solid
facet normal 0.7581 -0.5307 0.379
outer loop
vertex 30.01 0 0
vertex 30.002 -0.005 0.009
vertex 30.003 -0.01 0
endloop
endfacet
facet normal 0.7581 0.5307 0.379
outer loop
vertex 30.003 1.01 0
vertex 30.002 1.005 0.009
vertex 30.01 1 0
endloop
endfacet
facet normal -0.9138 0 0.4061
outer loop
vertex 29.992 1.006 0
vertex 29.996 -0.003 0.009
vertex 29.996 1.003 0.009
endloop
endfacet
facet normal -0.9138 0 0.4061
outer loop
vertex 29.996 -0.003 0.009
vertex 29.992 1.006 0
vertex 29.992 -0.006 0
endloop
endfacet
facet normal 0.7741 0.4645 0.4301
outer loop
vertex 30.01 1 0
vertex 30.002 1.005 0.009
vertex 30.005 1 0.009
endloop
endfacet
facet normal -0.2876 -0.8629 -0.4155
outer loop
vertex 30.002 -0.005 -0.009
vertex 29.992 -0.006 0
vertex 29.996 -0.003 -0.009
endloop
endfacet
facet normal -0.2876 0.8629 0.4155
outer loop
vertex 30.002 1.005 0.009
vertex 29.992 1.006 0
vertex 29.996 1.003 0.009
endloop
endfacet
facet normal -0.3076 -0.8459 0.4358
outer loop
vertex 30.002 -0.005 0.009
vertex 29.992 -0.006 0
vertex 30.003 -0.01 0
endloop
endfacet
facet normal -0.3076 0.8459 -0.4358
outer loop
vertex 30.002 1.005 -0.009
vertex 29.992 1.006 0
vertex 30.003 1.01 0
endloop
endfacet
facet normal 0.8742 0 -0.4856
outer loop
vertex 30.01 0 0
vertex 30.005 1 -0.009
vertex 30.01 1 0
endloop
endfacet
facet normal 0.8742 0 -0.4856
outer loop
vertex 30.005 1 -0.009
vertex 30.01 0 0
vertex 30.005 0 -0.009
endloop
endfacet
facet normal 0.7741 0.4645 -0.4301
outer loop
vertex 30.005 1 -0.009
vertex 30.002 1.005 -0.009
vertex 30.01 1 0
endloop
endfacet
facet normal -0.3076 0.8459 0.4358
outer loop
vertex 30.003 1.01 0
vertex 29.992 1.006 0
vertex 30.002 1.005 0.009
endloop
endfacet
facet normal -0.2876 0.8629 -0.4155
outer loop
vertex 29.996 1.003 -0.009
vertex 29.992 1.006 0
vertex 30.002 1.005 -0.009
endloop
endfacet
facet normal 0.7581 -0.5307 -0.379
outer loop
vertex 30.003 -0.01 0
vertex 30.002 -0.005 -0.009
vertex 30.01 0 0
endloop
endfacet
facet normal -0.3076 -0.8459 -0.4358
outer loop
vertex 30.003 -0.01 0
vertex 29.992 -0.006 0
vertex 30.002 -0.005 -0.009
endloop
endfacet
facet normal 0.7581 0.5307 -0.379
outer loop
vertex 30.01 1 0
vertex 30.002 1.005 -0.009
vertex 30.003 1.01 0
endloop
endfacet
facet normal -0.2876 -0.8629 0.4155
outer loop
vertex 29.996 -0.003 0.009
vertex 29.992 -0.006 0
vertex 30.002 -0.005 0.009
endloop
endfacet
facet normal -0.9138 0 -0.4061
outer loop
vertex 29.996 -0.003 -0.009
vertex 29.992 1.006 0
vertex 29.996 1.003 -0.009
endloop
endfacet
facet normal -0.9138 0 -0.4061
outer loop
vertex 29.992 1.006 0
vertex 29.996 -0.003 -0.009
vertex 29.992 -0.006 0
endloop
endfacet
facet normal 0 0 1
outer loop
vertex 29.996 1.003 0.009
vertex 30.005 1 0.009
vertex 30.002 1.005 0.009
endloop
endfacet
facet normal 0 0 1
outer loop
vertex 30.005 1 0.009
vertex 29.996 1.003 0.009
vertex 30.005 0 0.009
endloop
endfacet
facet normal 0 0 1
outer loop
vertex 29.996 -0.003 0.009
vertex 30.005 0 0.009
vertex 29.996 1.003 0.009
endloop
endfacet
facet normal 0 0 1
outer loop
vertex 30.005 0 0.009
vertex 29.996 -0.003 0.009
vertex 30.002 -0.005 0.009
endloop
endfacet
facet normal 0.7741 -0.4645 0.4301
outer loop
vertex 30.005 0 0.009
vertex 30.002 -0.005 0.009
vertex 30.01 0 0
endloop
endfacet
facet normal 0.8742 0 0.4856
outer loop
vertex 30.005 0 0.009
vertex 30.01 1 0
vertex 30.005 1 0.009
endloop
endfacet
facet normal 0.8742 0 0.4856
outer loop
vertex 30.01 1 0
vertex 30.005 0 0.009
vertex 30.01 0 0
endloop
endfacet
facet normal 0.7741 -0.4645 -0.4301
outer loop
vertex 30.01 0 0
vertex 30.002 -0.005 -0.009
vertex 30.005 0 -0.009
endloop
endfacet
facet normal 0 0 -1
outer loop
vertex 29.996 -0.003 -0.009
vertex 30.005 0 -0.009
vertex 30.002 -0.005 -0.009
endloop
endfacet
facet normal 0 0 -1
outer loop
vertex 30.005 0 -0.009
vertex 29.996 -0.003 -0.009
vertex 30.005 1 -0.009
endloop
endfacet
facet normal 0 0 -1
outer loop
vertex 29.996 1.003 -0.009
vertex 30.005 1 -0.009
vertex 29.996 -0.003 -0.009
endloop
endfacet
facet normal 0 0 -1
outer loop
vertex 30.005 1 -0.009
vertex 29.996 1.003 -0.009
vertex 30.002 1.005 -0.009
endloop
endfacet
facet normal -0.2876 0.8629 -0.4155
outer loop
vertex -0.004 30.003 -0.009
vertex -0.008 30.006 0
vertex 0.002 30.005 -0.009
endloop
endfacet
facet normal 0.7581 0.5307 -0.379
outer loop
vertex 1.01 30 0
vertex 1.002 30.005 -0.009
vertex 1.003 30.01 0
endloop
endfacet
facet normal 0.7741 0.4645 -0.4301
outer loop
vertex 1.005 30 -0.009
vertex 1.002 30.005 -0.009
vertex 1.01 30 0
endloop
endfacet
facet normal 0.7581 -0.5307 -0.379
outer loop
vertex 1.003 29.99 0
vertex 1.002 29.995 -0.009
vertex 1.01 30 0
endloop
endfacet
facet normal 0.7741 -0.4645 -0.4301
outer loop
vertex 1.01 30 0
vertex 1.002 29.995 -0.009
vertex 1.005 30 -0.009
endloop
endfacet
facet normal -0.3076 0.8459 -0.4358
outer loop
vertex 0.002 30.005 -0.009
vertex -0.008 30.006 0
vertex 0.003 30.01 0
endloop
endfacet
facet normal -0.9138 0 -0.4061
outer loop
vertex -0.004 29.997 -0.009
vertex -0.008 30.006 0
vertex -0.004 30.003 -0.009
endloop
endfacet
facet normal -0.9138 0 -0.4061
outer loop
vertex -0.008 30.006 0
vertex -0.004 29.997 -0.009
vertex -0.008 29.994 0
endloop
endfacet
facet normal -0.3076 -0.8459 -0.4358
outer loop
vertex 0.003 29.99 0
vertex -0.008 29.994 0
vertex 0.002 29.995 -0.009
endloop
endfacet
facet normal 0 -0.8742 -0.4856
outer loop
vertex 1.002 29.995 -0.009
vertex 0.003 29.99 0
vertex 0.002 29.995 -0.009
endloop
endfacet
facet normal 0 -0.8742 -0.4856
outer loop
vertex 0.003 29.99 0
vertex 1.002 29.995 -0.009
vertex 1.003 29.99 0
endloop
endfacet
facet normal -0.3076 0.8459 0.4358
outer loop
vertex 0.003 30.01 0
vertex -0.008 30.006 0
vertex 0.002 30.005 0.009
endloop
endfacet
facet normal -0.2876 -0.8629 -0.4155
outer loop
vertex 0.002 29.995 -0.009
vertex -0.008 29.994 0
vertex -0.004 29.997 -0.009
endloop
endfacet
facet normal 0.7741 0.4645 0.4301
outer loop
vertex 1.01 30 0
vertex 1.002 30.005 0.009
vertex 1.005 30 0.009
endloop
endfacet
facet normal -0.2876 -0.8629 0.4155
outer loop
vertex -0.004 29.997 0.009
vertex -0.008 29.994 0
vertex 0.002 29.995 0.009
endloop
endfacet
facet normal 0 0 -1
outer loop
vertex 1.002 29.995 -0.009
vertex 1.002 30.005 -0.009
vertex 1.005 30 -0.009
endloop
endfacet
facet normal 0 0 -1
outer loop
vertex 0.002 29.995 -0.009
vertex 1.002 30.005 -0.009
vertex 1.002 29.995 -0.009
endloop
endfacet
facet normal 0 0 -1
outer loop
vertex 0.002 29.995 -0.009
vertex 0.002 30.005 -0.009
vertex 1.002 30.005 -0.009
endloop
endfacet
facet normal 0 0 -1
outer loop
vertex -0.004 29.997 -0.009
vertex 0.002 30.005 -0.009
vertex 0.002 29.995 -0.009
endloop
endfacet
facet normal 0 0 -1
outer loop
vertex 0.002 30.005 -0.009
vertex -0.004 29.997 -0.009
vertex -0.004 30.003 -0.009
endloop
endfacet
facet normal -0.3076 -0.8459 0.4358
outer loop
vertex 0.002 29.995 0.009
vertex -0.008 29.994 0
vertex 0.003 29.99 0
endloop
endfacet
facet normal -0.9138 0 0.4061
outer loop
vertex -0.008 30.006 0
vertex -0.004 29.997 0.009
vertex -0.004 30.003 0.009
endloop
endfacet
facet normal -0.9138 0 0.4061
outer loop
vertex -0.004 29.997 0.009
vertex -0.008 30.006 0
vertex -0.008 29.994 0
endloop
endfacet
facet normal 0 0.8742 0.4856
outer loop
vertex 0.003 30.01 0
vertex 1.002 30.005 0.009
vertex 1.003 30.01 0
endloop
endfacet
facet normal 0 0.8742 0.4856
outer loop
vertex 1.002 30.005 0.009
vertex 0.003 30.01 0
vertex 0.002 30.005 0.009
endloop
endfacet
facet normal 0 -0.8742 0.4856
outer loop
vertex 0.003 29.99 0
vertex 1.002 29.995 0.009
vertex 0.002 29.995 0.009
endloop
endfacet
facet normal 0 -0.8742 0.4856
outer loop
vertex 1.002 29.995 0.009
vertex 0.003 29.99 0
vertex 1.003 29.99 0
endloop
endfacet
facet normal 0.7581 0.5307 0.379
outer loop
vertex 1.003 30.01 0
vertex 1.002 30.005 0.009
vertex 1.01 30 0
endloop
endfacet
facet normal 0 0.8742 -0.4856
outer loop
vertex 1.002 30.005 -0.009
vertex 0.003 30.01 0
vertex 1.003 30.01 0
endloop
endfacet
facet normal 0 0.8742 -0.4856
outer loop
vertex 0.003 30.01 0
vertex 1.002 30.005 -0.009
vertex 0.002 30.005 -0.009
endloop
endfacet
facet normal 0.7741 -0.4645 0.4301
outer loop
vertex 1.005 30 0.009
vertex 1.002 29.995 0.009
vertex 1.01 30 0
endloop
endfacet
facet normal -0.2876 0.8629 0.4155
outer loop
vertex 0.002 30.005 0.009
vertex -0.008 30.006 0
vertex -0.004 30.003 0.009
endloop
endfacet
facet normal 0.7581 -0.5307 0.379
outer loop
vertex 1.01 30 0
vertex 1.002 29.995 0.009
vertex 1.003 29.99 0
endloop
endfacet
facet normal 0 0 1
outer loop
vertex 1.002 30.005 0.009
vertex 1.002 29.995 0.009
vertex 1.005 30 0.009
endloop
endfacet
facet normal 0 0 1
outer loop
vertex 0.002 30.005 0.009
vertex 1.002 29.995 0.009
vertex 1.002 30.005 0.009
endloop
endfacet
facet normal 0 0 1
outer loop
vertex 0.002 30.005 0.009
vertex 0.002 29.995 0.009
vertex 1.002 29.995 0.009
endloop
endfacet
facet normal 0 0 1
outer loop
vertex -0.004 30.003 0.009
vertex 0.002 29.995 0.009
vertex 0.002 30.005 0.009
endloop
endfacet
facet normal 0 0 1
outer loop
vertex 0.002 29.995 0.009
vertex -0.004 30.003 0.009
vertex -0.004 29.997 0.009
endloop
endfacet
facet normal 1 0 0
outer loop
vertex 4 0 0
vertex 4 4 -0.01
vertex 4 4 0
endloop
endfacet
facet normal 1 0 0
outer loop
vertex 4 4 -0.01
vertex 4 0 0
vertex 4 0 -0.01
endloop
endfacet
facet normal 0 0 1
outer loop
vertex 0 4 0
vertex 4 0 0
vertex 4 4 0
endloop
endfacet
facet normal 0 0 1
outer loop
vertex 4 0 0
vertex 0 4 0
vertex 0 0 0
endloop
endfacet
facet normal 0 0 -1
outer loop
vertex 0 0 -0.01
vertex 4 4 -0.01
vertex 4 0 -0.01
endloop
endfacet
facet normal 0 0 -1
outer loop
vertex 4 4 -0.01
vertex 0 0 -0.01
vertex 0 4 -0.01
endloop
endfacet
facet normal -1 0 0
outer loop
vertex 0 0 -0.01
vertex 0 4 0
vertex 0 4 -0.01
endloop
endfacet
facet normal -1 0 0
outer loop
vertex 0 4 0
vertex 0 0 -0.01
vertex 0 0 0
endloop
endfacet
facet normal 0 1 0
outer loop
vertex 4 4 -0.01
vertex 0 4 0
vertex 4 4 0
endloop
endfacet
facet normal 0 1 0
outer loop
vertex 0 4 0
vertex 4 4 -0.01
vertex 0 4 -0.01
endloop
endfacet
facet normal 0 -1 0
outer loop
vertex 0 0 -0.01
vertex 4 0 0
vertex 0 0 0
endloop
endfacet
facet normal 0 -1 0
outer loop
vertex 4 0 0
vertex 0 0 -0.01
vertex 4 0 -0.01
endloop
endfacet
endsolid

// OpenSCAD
hull(){
    translate([30, 0]) sphere(0.01);
    translate([30, 1]) sphere(0.01);
}
hull(){
    translate([1, 30]) sphere(0.01);
    translate([0, 30]) sphere(0.01);
}
translate([0,0,-0.01]) color([0.1,0.1,0.1]) cube([4,4,0.01]);
